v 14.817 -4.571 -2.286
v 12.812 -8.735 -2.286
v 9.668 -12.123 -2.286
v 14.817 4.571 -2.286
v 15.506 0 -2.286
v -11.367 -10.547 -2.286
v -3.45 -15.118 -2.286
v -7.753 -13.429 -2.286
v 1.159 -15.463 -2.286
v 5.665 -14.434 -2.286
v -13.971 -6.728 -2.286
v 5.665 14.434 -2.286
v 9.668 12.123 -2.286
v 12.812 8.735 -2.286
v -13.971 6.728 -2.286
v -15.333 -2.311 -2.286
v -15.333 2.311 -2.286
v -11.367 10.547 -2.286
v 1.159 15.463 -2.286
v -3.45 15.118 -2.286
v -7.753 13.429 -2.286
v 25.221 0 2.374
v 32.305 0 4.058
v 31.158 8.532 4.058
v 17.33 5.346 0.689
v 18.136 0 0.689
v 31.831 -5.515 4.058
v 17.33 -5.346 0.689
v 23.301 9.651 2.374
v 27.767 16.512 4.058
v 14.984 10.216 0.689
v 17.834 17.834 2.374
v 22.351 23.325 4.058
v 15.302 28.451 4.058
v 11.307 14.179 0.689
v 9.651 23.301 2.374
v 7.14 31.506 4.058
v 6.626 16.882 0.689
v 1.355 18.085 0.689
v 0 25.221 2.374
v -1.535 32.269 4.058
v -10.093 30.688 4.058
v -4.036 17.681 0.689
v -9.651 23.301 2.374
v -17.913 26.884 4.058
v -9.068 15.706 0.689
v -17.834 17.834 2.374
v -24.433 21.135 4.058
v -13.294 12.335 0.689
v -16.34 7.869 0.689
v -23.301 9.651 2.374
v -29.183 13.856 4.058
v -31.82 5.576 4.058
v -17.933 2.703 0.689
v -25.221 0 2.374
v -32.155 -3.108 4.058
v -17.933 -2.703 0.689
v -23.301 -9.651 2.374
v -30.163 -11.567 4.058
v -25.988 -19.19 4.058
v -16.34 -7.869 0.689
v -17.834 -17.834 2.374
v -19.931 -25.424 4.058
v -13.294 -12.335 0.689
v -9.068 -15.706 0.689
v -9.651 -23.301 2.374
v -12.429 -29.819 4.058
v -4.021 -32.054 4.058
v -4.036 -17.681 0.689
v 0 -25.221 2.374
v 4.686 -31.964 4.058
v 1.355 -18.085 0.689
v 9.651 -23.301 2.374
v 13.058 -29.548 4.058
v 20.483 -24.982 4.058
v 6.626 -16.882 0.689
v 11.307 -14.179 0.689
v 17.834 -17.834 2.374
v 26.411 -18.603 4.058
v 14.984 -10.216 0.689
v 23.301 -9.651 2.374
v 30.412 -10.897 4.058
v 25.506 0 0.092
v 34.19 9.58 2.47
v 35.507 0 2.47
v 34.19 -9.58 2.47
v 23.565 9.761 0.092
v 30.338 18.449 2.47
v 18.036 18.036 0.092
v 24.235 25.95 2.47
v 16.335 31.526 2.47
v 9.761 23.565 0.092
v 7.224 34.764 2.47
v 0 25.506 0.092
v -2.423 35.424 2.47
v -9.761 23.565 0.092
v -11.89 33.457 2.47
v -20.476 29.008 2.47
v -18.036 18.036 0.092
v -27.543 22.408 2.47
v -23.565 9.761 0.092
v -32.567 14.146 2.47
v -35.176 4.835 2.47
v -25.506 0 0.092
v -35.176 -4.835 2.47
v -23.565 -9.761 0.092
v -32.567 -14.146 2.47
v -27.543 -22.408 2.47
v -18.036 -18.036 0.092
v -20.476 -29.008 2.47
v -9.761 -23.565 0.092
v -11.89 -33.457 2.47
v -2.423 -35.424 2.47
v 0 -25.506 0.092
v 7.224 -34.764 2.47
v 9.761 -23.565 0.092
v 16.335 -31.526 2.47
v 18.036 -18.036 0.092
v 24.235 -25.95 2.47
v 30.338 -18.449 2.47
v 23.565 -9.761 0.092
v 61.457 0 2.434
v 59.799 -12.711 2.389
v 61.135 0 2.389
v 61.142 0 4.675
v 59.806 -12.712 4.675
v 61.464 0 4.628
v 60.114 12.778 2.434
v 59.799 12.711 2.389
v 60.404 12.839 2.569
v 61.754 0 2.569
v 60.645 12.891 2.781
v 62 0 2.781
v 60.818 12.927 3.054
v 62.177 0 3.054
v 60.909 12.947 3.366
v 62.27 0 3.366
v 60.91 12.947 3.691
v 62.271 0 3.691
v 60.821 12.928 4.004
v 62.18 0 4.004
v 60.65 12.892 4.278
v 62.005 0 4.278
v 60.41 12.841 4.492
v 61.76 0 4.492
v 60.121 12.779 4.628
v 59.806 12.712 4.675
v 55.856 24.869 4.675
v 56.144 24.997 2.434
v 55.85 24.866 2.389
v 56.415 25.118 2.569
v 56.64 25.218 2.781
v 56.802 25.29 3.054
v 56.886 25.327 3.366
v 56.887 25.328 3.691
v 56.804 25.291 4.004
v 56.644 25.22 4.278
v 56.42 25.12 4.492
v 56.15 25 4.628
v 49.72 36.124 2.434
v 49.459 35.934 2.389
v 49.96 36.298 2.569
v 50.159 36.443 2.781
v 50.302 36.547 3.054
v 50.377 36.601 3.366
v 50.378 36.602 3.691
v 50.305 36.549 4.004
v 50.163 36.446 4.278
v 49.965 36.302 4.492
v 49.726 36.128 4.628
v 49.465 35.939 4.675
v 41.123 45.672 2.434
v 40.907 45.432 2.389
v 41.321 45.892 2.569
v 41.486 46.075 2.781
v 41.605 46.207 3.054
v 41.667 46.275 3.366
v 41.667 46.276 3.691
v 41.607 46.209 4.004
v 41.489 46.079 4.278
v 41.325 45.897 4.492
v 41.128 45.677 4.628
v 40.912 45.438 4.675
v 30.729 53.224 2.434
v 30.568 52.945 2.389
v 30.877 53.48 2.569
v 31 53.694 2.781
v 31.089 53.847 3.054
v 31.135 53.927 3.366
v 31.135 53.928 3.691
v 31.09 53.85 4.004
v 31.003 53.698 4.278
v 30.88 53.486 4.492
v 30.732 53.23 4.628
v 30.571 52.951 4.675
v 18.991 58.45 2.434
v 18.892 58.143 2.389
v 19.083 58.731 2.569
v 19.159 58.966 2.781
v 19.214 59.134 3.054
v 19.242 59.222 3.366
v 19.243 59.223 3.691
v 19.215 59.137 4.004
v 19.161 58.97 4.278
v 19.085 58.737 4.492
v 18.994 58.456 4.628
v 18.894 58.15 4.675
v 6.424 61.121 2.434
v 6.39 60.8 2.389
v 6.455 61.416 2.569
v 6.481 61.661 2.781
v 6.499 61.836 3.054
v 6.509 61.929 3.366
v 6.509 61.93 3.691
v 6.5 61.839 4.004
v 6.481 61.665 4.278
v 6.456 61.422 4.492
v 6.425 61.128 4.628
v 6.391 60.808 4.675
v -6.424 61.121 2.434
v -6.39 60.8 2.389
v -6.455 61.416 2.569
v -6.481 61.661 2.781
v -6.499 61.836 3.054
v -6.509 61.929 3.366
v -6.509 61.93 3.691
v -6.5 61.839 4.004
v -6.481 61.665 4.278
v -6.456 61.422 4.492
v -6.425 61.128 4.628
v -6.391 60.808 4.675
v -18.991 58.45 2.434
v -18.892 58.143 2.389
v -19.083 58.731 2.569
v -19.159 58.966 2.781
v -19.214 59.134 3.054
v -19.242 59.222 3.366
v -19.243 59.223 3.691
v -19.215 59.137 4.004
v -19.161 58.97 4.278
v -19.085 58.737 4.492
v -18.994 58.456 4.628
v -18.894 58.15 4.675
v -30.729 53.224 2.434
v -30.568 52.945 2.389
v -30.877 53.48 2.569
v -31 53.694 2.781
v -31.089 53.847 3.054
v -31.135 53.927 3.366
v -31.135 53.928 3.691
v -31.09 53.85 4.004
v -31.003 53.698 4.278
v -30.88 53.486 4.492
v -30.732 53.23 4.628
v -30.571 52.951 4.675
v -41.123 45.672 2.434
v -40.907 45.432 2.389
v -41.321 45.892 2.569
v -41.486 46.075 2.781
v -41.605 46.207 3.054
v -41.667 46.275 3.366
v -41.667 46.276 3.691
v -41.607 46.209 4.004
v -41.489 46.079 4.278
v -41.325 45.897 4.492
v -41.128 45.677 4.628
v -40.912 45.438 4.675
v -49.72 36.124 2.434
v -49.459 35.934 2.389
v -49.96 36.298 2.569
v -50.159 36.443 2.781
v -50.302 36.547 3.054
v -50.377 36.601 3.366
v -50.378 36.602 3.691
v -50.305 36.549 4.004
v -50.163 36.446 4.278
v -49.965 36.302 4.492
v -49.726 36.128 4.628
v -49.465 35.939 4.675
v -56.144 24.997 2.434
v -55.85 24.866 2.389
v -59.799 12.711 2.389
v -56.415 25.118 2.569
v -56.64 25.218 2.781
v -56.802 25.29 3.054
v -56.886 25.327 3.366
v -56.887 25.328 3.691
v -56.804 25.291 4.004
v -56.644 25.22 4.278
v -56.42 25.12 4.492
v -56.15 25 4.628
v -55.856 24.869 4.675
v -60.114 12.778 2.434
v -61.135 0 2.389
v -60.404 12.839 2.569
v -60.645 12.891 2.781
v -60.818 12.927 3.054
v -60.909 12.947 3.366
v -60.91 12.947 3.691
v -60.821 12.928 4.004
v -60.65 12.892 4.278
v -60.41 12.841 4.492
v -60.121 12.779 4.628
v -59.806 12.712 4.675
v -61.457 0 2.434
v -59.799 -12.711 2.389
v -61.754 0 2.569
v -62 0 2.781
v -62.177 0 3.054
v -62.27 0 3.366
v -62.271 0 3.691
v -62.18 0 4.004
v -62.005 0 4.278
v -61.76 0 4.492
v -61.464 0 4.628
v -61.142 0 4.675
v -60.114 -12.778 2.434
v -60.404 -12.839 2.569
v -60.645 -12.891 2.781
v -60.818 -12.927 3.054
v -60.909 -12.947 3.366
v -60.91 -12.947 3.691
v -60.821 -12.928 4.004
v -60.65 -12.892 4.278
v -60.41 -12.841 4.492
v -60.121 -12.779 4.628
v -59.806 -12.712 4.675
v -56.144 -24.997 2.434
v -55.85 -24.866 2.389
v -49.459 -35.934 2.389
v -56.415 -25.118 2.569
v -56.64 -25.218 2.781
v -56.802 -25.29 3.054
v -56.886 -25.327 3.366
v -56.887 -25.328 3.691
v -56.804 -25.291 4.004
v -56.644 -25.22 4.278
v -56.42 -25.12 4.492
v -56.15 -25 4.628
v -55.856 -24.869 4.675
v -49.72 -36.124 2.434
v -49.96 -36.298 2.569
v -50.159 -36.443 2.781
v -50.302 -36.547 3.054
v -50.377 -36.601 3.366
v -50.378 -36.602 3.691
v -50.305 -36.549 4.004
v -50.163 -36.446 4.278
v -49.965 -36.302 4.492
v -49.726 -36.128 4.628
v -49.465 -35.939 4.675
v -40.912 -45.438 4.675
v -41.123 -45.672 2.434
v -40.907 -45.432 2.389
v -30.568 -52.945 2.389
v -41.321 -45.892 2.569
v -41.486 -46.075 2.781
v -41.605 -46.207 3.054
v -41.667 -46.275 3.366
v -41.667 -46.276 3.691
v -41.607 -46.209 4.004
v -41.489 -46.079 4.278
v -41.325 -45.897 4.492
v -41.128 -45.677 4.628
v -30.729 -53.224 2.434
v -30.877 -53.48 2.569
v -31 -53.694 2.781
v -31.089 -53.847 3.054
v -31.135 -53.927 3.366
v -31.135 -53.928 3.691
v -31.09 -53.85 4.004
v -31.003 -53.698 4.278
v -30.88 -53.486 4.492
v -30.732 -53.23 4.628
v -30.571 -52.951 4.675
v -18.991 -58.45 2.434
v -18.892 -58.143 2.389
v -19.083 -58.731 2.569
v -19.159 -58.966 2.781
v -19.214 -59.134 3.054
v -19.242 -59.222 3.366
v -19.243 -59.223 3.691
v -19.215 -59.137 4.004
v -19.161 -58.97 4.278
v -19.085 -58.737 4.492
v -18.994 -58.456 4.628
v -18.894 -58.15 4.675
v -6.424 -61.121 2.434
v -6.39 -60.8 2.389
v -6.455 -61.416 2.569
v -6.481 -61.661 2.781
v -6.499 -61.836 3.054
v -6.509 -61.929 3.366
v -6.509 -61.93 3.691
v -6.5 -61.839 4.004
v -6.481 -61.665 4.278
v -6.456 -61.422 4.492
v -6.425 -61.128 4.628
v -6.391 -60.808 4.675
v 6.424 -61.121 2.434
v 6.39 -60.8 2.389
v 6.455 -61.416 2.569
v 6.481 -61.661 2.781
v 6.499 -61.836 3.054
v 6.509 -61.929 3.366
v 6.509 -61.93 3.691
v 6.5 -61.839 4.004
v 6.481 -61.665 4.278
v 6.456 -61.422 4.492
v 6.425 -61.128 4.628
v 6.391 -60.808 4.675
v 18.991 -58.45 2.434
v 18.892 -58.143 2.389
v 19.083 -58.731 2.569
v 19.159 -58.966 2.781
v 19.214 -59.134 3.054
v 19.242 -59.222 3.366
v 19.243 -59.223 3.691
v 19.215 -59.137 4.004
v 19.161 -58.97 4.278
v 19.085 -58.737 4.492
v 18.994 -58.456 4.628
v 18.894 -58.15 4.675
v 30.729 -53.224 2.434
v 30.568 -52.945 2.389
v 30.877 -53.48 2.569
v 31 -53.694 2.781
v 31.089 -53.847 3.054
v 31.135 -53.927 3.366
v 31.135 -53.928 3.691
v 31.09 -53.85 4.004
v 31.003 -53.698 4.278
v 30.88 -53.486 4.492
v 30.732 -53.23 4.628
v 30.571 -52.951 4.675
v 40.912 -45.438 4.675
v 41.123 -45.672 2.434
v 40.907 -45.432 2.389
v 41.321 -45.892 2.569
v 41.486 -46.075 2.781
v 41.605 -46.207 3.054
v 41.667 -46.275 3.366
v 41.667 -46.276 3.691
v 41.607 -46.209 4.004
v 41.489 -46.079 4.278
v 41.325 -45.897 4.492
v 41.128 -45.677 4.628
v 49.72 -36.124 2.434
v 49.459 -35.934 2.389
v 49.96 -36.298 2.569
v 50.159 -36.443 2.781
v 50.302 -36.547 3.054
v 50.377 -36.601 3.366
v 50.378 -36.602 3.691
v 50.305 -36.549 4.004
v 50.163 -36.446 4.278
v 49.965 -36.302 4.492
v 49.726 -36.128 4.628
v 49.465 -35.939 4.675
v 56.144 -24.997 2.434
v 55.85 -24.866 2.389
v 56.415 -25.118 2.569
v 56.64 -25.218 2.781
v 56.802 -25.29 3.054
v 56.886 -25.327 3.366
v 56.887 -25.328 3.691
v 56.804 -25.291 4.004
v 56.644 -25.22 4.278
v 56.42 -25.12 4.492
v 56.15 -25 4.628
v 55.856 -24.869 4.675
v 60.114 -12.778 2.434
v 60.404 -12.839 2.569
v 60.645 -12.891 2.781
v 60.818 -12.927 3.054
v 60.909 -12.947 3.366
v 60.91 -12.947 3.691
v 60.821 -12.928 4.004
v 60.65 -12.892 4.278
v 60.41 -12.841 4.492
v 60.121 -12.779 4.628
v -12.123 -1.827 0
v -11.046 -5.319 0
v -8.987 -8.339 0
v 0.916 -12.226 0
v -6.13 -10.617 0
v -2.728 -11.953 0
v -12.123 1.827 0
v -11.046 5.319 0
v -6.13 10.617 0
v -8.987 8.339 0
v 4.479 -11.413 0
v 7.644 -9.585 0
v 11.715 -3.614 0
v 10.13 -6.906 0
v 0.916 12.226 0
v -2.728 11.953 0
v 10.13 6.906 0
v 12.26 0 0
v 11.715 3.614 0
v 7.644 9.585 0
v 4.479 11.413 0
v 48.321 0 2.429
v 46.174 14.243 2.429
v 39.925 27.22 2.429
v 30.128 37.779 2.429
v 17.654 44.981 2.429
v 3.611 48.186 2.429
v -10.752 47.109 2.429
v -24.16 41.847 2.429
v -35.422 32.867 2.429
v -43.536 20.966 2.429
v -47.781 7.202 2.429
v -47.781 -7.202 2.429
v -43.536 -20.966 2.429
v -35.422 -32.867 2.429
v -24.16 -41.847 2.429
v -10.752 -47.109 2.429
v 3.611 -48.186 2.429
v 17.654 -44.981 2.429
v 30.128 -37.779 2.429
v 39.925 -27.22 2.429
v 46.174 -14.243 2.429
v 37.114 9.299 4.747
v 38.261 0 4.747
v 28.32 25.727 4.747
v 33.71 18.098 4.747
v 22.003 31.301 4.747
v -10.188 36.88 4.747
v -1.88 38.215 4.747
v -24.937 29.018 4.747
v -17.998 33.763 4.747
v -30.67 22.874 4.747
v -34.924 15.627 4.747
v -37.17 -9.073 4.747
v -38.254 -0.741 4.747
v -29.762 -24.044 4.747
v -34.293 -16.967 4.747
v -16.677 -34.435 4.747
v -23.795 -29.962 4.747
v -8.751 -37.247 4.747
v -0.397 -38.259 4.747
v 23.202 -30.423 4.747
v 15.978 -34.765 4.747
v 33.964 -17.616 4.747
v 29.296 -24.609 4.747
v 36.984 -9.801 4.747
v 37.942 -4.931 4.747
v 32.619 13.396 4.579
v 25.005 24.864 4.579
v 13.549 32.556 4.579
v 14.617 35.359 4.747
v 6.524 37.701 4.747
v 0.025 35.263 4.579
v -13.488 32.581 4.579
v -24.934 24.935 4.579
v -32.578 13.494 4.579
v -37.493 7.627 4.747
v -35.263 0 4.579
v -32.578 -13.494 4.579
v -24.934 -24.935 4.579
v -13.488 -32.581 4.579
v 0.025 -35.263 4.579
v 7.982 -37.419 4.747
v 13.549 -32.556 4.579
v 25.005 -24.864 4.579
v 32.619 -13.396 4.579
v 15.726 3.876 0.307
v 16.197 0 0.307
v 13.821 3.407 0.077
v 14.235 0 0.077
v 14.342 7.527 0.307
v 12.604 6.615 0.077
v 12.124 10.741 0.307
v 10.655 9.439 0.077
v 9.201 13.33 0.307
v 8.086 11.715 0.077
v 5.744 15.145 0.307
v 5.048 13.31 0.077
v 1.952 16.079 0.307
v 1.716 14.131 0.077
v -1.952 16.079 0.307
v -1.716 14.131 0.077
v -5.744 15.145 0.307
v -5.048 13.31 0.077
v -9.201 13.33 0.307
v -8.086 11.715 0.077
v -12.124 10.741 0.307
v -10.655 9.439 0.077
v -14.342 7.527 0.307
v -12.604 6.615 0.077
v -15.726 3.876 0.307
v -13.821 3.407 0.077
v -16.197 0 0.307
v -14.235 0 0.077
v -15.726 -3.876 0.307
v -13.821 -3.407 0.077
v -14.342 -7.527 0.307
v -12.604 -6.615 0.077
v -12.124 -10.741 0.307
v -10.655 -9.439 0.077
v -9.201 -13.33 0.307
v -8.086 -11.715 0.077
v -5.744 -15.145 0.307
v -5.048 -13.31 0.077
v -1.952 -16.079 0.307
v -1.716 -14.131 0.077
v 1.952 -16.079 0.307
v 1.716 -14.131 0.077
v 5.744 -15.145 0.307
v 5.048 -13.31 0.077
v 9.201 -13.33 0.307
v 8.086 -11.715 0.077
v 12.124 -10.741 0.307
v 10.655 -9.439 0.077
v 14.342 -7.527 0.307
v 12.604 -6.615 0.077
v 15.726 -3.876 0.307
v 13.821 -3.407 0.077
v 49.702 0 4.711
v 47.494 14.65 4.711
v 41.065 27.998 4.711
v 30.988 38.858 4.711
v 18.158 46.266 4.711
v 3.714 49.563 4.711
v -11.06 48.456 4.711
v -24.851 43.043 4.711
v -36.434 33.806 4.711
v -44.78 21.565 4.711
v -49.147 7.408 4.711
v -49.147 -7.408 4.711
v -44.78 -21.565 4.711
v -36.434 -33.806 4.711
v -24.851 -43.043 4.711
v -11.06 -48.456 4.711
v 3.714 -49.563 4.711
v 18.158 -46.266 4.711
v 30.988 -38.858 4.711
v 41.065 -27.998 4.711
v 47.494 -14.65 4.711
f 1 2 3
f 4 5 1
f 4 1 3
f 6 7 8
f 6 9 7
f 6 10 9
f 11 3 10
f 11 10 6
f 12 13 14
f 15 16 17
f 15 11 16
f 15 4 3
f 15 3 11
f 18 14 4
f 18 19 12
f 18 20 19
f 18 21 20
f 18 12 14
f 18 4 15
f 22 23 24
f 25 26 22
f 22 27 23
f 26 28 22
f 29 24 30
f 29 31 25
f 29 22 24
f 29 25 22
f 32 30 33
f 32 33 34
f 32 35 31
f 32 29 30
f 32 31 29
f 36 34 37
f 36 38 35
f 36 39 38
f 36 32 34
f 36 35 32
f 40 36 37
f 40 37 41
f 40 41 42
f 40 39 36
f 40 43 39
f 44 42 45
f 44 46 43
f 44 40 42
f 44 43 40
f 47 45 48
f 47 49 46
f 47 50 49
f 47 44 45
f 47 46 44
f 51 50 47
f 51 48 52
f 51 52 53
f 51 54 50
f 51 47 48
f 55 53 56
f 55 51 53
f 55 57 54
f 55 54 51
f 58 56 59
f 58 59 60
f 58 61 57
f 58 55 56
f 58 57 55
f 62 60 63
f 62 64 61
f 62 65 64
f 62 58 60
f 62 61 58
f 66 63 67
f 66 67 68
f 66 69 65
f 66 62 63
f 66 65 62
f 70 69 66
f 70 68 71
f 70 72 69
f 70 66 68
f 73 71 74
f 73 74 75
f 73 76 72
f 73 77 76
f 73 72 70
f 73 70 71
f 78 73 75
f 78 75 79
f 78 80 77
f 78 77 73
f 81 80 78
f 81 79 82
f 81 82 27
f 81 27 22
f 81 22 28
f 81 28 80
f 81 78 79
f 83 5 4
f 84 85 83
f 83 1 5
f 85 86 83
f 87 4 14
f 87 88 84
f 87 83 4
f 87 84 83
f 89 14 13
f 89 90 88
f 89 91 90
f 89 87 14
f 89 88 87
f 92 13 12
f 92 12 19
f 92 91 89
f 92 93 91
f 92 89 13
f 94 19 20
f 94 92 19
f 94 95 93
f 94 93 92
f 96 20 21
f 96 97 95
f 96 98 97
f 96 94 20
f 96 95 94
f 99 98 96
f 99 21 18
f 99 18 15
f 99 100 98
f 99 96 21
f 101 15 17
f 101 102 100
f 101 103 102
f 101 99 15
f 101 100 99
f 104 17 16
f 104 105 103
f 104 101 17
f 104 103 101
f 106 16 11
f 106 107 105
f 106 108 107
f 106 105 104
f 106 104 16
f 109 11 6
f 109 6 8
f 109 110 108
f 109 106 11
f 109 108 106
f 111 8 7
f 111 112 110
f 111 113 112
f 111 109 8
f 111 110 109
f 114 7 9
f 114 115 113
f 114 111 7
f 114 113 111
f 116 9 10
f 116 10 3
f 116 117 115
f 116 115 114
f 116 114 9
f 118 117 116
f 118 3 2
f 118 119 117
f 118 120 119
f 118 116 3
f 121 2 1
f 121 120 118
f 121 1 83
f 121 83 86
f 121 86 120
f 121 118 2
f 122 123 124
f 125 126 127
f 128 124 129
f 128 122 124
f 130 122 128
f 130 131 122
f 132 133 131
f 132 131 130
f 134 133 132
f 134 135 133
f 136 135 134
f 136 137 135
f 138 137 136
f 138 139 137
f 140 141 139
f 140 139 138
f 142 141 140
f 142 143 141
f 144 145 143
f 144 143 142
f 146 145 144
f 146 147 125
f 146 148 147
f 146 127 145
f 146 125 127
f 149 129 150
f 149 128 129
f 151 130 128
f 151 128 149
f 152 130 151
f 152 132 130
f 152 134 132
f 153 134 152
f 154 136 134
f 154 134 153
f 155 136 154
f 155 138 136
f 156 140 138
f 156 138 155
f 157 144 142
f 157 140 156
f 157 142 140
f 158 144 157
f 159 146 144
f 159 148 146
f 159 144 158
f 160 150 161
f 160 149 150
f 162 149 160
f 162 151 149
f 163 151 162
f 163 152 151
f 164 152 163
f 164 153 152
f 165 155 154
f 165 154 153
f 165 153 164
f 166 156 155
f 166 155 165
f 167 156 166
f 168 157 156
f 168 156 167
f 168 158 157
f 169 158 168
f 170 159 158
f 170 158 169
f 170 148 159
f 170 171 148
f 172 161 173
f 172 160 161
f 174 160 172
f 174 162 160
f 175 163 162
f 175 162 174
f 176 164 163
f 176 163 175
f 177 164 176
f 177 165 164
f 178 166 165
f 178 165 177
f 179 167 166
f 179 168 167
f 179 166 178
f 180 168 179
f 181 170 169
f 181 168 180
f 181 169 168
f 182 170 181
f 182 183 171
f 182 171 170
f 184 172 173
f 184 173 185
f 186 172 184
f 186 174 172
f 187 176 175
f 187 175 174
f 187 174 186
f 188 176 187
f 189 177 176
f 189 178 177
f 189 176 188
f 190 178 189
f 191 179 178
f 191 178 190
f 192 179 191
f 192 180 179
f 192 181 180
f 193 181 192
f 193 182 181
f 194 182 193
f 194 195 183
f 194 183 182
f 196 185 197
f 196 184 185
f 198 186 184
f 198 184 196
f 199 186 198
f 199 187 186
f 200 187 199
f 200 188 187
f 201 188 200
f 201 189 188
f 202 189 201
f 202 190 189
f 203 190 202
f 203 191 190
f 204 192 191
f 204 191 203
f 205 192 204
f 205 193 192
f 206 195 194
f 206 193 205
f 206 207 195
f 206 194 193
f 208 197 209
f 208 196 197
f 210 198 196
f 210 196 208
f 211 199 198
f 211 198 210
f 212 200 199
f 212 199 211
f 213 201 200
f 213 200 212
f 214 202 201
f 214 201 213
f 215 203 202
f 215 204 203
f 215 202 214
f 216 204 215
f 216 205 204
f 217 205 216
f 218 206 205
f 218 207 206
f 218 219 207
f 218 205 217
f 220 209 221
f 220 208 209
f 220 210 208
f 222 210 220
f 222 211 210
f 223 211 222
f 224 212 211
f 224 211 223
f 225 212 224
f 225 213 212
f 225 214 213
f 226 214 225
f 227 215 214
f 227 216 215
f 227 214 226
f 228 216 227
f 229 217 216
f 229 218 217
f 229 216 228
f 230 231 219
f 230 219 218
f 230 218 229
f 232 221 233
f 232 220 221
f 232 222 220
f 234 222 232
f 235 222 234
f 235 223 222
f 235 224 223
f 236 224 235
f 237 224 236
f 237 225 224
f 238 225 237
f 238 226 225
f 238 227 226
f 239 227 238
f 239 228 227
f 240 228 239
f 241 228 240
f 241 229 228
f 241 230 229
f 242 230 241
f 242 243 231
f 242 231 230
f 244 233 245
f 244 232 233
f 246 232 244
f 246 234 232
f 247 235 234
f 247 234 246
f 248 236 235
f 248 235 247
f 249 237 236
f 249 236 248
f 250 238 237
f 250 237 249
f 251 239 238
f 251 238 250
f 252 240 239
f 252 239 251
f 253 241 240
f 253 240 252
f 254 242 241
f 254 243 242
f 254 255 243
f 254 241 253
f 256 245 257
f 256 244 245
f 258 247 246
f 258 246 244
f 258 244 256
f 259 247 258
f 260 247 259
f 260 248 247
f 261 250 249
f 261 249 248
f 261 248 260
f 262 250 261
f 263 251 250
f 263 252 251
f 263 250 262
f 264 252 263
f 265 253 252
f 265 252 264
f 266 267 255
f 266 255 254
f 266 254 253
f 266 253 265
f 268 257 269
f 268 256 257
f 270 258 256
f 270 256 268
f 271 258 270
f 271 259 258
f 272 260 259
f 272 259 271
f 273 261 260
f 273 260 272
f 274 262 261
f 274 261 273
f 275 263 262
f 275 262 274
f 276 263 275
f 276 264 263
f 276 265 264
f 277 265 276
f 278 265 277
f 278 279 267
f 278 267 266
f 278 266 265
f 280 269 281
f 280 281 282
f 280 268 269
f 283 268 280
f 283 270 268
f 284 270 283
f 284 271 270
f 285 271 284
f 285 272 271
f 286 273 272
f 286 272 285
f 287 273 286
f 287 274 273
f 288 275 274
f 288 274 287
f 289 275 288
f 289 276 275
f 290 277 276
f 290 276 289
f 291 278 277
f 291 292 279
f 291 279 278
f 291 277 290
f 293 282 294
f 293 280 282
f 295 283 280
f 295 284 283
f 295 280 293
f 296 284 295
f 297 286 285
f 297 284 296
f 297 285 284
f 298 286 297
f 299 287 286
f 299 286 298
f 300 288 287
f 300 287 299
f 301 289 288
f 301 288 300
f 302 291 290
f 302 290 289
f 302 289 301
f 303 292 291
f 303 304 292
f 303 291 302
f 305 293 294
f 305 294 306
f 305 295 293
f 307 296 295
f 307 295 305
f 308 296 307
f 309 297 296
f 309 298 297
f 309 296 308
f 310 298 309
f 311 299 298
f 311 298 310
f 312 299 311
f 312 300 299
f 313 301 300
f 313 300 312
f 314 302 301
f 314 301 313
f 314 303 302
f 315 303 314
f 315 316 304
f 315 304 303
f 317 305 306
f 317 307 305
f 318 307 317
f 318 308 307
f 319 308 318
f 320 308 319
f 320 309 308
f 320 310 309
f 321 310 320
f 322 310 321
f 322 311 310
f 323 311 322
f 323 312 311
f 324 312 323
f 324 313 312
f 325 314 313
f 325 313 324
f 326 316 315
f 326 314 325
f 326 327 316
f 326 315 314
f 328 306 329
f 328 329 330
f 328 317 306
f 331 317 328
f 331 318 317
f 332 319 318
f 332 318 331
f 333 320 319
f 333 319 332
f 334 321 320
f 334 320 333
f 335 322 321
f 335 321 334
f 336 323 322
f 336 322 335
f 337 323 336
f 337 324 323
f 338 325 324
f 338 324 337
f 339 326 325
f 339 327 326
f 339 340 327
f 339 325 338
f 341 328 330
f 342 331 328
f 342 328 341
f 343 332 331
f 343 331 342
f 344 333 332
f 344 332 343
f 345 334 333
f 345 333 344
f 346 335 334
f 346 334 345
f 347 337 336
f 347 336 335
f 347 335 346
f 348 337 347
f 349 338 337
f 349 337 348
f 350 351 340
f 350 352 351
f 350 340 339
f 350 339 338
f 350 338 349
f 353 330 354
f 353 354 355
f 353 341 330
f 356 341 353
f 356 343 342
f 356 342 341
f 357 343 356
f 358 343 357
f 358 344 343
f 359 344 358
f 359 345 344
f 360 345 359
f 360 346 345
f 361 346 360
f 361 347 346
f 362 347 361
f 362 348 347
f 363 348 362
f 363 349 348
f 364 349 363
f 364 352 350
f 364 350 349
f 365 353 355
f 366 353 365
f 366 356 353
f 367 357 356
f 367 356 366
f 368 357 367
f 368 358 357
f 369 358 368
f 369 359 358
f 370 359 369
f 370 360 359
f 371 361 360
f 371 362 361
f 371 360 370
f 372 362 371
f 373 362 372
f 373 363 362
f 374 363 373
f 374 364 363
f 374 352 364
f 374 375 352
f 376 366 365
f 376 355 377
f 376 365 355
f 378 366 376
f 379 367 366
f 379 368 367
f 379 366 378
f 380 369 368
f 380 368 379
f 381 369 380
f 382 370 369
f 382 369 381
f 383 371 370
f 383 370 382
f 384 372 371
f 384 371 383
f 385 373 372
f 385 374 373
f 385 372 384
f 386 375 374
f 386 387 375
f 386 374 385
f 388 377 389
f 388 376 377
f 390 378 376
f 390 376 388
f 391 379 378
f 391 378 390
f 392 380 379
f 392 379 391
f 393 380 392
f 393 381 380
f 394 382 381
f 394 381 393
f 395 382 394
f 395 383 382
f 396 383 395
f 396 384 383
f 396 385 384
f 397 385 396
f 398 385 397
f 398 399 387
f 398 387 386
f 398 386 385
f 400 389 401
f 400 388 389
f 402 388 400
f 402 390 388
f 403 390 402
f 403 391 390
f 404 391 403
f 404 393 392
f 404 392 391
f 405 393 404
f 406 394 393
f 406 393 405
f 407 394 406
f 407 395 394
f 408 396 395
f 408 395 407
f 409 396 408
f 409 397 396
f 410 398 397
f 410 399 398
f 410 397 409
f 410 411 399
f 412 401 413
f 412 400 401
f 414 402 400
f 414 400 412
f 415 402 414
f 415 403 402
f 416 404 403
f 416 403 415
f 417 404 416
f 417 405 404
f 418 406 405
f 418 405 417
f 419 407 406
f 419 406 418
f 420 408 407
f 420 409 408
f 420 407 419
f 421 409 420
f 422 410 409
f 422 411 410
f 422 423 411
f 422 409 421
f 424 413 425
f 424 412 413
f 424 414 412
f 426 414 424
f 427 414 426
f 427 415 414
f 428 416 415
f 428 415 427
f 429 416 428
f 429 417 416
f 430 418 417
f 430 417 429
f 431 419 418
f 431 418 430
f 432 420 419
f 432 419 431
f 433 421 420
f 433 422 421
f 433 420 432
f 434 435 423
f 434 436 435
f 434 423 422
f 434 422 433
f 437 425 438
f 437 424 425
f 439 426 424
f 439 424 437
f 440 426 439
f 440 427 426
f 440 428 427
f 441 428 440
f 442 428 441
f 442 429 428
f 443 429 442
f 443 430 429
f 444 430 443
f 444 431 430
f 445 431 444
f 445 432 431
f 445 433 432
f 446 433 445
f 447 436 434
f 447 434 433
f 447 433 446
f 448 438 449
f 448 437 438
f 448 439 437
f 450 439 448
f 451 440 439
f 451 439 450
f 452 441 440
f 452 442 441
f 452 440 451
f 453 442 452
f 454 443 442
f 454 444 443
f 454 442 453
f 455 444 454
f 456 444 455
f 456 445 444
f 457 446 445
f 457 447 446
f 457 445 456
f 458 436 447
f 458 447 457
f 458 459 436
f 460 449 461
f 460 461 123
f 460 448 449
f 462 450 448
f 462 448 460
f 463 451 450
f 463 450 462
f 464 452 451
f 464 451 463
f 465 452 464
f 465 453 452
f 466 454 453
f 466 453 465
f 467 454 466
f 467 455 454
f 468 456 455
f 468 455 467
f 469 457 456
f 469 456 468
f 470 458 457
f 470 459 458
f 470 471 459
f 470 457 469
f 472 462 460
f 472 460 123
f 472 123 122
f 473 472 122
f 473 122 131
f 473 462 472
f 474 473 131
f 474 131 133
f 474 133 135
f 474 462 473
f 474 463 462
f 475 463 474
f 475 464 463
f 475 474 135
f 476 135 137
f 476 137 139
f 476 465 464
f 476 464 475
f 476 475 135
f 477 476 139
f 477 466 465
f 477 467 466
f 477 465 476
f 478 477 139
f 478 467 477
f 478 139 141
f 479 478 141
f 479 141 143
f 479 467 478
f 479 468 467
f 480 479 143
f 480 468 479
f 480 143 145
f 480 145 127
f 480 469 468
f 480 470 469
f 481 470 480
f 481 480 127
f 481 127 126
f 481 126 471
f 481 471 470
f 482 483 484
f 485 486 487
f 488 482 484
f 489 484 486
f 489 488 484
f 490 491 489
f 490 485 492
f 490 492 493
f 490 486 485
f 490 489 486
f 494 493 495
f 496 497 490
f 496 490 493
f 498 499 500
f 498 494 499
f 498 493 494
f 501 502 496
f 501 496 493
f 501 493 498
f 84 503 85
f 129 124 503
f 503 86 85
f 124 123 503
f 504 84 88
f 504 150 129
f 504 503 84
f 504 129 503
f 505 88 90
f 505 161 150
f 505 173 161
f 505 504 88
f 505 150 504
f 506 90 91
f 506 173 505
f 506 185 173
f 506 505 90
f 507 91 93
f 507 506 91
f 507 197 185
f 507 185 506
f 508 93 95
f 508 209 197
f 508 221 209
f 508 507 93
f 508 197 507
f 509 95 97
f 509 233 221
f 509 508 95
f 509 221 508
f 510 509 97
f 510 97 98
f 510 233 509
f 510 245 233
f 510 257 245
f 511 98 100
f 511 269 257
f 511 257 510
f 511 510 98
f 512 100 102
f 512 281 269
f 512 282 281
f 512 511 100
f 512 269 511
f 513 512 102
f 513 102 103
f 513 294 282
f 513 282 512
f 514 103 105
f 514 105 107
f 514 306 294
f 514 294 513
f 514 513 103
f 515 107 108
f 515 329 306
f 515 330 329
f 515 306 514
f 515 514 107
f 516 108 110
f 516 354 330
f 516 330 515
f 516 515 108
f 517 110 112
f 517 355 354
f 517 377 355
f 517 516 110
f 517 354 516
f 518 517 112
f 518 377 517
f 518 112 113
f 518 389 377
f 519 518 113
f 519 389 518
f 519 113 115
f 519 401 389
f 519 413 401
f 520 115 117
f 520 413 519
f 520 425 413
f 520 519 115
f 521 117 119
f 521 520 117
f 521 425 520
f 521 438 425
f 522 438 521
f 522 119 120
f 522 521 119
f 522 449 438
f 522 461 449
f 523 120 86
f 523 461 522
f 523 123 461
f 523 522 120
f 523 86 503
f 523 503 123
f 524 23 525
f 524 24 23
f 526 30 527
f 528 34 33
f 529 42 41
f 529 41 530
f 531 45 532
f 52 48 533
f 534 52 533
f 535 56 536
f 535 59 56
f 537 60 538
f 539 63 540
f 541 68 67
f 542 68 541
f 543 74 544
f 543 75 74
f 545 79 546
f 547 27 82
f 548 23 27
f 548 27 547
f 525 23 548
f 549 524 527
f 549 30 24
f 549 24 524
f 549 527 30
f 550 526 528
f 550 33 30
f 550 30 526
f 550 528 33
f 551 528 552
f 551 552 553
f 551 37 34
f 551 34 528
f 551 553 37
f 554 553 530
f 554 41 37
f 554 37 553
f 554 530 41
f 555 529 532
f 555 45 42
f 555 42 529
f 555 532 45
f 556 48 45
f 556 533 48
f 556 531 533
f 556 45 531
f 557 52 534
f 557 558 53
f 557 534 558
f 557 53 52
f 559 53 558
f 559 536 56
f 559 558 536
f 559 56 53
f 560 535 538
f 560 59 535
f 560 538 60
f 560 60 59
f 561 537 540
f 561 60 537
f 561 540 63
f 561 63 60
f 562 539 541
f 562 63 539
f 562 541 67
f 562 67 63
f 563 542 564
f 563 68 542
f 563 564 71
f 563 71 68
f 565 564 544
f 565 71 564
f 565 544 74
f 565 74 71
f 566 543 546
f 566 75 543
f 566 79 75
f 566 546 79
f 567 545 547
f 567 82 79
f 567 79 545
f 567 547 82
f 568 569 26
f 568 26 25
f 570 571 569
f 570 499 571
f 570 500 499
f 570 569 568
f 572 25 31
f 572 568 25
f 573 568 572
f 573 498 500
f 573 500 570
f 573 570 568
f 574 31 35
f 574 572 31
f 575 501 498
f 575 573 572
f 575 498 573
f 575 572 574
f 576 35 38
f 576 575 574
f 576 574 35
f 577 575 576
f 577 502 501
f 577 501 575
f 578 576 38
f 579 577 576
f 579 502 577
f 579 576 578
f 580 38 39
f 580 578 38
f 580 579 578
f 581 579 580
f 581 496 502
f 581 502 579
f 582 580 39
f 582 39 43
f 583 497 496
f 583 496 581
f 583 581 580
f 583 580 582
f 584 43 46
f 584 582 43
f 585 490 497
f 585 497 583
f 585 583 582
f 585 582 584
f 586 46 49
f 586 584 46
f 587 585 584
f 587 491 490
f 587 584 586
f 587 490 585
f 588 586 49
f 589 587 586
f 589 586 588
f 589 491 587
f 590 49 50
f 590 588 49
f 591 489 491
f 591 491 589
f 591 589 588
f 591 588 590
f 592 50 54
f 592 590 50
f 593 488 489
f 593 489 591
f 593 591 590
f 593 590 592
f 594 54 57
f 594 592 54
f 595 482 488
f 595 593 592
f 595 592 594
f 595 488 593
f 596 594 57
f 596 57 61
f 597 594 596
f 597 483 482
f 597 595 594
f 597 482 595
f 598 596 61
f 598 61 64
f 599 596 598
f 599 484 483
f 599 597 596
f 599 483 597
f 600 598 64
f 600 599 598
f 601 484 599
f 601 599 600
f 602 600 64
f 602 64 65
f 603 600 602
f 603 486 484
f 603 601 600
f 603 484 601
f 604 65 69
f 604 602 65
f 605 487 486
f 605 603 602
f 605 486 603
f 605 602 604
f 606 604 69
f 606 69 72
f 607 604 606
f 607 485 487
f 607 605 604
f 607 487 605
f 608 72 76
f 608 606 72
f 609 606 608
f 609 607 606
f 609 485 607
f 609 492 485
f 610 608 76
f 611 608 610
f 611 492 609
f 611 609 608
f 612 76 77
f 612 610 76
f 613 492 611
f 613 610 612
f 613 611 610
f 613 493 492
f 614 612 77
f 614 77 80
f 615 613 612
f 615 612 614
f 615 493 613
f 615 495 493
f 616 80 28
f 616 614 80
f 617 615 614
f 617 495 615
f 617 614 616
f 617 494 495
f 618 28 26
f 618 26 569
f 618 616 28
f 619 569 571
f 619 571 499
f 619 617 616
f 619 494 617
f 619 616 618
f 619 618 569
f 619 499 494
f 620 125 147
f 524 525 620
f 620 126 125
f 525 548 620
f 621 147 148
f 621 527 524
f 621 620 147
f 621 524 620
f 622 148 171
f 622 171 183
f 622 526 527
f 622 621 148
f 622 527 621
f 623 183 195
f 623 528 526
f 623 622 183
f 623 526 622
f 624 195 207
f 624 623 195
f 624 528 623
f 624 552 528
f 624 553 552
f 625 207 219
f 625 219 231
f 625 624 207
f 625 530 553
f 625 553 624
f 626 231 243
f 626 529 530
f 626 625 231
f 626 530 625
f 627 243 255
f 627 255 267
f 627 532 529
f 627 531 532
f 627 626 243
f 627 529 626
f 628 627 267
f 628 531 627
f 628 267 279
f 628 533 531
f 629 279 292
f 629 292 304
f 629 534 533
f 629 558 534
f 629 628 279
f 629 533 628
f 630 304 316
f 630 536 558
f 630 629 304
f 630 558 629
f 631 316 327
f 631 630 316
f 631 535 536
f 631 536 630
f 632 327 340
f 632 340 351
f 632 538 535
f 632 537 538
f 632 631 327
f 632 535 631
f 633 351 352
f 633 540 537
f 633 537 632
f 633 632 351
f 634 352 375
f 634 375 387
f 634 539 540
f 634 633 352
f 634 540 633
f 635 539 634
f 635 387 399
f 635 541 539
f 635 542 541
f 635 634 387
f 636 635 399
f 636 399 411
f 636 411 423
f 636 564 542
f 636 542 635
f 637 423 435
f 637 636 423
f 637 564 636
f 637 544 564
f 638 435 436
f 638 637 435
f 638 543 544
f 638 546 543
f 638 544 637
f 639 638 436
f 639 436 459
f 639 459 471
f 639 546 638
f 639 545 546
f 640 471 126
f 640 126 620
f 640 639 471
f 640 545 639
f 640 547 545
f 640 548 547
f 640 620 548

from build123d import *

# Parameters (mm, degrees)
F3_R = 25.4


with BuildPart() as f2:
    # F0 (on Front) → F2 (revolve)
    with BuildSketch(Plane.XZ):
        with BuildLine():
            Line((35.242144, 4.75648), (15.238293, 0))
            Line((15.238293, 0), (0, 0))
            Line((0, 0), (0, -2.286))
            Line((0, -2.286), (15.506336, -2.286))
            Line((15.506336, -2.286), (35.506643, 2.469638))
            Line((35.506643, 2.469638), (61.135289, 2.389061))
            ThreePointArc((61.135289, 2.389061), (62.281877, 3.528461), (61.142476, 4.675049))
            Line((61.142476, 4.675049), (35.242144, 4.75648))
        make_face()
    revolve(axis=Axis((0, 0, 4.155044), (0, 0, 1)))

    # F3
    f3_edges = [f2.edges().sort_by_distance(p)[0] for p in [
        (-35.242144, 0, 4.75648),
        (-15.238293, 0, 0),
    ]]
    fillet(f3_edges, radius=F3_R)


solid = f2.part
